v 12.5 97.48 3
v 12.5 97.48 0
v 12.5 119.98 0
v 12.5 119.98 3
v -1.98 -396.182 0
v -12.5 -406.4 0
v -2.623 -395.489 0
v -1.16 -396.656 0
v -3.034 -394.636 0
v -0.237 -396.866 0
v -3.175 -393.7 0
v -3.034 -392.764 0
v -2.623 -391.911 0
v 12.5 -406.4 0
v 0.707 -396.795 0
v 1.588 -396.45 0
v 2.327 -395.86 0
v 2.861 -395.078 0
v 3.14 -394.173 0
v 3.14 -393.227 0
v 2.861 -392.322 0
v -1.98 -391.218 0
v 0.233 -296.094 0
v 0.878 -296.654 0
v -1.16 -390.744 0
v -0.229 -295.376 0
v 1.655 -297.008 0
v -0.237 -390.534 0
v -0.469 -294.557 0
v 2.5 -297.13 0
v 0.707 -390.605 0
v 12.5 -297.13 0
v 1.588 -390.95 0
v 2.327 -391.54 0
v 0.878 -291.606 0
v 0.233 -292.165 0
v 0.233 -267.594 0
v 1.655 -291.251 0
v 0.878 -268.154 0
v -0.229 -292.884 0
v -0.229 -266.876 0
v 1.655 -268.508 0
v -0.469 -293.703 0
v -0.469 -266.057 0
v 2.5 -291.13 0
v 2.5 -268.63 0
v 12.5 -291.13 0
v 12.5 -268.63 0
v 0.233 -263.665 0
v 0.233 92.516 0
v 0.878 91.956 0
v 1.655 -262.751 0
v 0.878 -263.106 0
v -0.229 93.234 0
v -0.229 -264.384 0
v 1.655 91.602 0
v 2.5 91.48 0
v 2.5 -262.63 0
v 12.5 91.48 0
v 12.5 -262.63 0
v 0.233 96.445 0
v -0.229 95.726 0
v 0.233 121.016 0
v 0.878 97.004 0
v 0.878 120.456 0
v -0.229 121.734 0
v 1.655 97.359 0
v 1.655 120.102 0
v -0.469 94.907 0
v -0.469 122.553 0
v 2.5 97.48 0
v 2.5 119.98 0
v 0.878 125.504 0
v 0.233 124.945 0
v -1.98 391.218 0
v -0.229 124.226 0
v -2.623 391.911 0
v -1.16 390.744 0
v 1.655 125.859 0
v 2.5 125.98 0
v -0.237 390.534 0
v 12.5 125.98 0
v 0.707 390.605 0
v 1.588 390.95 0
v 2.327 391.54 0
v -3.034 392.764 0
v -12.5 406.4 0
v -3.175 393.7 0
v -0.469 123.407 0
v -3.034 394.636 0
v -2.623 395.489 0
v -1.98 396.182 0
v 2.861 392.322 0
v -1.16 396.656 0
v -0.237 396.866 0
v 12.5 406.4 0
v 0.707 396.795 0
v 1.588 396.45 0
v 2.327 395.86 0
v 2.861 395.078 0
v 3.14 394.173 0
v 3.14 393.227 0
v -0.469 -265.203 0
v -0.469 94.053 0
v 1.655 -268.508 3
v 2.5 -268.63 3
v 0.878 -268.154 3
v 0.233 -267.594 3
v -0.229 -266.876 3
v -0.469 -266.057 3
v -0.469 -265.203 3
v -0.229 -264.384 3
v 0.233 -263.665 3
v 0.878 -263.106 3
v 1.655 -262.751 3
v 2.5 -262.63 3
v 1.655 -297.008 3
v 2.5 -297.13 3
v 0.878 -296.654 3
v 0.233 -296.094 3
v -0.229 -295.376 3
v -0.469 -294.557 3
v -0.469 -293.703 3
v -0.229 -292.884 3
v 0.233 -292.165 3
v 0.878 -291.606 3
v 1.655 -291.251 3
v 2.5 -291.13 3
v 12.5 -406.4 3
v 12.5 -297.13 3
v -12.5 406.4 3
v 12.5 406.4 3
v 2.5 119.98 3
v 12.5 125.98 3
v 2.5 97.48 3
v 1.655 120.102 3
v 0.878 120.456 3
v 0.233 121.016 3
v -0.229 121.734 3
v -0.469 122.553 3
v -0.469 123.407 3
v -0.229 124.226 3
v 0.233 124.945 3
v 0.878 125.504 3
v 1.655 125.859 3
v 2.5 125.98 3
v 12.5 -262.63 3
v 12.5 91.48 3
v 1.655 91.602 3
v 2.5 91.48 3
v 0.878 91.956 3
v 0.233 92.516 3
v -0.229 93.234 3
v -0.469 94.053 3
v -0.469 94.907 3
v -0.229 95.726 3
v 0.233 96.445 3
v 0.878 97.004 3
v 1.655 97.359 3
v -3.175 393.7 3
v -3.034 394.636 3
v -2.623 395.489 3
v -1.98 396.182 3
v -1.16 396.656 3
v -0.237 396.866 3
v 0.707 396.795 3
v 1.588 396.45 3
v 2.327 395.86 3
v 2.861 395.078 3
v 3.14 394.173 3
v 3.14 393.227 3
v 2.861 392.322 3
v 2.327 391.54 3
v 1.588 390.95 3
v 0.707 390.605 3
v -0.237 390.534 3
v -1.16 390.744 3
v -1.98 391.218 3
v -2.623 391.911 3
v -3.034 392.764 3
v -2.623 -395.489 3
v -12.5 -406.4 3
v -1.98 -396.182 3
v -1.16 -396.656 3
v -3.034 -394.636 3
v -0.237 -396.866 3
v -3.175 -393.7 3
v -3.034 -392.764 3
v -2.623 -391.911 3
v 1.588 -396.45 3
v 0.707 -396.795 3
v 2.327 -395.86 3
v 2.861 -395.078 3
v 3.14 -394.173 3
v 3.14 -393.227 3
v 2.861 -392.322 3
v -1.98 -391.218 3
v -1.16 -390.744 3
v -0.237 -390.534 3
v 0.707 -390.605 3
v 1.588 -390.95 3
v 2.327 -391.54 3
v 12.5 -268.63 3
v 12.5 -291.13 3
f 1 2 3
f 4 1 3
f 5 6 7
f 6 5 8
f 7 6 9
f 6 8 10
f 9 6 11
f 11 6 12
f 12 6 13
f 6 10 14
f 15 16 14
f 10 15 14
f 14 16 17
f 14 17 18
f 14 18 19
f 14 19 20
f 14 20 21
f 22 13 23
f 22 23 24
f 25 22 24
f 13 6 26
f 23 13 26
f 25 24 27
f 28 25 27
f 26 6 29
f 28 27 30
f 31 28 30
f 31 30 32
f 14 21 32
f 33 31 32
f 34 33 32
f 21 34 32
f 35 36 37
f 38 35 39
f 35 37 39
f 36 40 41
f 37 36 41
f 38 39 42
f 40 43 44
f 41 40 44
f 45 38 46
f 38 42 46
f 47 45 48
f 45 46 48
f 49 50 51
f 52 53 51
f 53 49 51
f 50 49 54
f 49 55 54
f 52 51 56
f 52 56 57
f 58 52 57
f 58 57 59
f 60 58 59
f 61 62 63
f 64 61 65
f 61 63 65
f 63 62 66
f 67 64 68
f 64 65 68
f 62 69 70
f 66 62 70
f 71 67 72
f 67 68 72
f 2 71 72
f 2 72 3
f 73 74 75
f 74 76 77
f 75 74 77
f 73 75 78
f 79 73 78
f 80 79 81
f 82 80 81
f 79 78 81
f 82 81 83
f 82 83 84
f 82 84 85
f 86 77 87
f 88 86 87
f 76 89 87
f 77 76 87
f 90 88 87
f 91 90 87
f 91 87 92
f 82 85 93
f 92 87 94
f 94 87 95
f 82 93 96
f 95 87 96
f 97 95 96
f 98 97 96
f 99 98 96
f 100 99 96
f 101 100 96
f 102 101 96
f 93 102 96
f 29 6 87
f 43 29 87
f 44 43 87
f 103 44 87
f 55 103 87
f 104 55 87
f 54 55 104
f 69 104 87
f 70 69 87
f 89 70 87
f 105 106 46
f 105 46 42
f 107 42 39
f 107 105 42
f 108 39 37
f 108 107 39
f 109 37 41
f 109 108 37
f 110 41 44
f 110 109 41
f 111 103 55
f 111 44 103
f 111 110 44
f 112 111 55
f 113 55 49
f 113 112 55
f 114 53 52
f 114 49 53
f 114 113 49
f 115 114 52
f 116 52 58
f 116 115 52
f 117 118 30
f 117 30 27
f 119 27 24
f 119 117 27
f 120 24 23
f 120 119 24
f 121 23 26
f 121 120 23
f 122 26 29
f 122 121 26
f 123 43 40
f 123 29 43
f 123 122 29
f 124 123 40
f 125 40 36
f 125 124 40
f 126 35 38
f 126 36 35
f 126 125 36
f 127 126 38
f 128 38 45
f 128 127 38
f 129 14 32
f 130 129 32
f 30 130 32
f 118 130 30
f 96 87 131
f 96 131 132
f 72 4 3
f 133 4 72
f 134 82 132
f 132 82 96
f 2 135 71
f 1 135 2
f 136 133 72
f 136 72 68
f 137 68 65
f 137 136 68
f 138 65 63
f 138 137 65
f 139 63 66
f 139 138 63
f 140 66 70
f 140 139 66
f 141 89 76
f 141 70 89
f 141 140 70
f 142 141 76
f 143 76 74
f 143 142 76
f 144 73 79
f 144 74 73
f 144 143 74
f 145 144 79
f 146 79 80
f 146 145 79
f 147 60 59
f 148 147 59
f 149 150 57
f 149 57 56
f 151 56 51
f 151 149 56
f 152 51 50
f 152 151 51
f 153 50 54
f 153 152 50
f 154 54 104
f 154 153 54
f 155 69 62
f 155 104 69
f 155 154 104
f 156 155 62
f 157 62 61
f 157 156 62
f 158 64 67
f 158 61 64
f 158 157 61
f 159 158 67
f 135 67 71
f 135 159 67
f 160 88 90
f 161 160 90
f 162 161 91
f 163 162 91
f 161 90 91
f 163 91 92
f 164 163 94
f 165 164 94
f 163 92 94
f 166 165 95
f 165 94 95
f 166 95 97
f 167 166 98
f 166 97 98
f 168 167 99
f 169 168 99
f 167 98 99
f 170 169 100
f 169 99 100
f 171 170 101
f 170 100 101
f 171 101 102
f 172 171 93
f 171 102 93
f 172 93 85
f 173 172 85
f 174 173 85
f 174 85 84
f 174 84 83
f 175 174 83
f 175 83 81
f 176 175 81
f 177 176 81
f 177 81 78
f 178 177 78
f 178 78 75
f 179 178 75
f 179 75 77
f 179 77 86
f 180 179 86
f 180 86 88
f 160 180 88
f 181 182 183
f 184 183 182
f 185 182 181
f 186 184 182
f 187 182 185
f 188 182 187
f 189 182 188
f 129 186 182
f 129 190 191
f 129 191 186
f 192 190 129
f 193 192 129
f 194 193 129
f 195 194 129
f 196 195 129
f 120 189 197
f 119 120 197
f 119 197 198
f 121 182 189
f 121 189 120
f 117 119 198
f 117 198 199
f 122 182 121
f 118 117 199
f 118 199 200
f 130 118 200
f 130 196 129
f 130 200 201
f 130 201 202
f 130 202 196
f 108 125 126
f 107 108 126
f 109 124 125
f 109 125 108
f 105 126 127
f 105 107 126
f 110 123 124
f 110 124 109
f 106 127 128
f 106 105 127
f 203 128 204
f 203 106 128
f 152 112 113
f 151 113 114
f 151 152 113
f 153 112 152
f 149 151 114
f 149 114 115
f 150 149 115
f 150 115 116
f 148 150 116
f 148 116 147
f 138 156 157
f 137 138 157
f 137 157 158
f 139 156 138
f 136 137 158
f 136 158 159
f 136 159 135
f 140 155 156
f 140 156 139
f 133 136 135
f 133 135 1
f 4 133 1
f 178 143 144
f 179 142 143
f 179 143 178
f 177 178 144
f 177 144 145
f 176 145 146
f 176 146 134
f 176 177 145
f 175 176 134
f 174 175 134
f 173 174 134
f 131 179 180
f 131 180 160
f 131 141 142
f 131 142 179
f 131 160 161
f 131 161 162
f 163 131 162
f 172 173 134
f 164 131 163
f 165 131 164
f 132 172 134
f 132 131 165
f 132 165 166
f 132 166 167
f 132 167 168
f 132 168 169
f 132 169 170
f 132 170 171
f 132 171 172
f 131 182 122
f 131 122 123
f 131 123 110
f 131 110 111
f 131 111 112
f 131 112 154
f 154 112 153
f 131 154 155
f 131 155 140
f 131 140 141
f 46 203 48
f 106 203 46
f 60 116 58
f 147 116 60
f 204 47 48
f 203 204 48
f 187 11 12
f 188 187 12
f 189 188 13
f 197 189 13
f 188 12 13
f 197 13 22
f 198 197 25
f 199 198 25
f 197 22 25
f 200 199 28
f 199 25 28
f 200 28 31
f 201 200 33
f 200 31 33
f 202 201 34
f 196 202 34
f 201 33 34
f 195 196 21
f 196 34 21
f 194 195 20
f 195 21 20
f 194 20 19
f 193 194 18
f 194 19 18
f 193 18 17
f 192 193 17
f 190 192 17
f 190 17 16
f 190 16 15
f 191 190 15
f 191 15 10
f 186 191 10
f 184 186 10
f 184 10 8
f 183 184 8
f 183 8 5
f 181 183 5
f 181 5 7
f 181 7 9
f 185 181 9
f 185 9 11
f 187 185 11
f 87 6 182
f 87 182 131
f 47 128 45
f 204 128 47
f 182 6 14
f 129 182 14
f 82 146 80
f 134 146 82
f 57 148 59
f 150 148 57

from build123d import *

# Parameters (mm, degrees)
SKETCH1_W                       = 25
SKETCH1_H                       = 812.8
BOSS_EXTRUDE1_DEPTH             = 3
CUT_EXTRUDE4_DEPTH              = 10
F_1_4_0_25_DIAMETER_HOLE1_D     = 6.35
F_1_4_0_25_DIAMETER_HOLE1_DEPTH = 5.84
F_1_4_0_25_DIAMETER_HOLE1_TIP   = 1.907732465


with BuildPart() as part:
    # Sketch1 → Boss-Extrude1 (new body)
    with BuildSketch(Plane.XY):
        Rectangle(SKETCH1_W, SKETCH1_H)
    extrude(amount=BOSS_EXTRUDE1_DEPTH)

    # Sketch5 → Cut-Extrude4 (cut)
    with BuildSketch(Plane.XY.offset(3)):
        with BuildLine():
            Line((2.5, 125.980140029), (22.5, 125.980140029))
            ThreePointArc((22.5, 125.980140029), (25.5, 122.980140029), (22.5, 119.980140029))
            Line((22.5, 119.980140029), (2.5, 119.980140029))
            ThreePointArc((2.5, 119.980140029), (-0.5, 122.980140029), (2.5, 125.980140029))
        make_face()
        with BuildLine():
            Line((2.5, 97.480140029), (22.5, 97.480140029))
            ThreePointArc((22.5, 97.480140029), (25.5, 94.480140029), (22.5, 91.480140029))
            Line((22.5, 91.480140029), (2.5, 91.480140029))
            ThreePointArc((2.5, 91.480140029), (-0.5, 94.480140029), (2.5, 97.480140029))
        make_face()
        with BuildLine():
            Line((2.5, -262.629859971), (22.5, -262.629859971))
            ThreePointArc((22.5, -262.629859971), (25.5, -265.629859971), (22.5, -268.629859971))
            Line((22.5, -268.629859971), (2.5, -268.629859971))
            ThreePointArc((2.5, -268.629859971), (-0.5, -265.629859971), (2.5, -262.629859971))
        make_face()
        with BuildLine():
            Line((2.5, -291.129859971), (22.5, -291.129859971))
            ThreePointArc((22.5, -291.129859971), (25.5, -294.129859971), (22.5, -297.129859971))
            Line((22.5, -297.129859971), (2.5, -297.129859971))
            ThreePointArc((2.5, -297.129859971), (-0.5, -294.129859971), (2.5, -291.129859971))
        make_face()
    extrude(amount=-CUT_EXTRUDE4_DEPTH, mode=Mode.SUBTRACT)

    # 1/4 (0.25) Diameter Hole1
    with Locations(Plane.XY.offset(3)):
        with Locations((0, 393.7), (0, -393.7)):
            Hole(F_1_4_0_25_DIAMETER_HOLE1_D / 2, depth=F_1_4_0_25_DIAMETER_HOLE1_DEPTH)
            with Locations((0, 0, -(F_1_4_0_25_DIAMETER_HOLE1_DEPTH + F_1_4_0_25_DIAMETER_HOLE1_TIP / 2))):  # 118° drill point
                Cone(0, F_1_4_0_25_DIAMETER_HOLE1_D / 2, F_1_4_0_25_DIAMETER_HOLE1_TIP, mode=Mode.SUBTRACT)


solid = part.part
